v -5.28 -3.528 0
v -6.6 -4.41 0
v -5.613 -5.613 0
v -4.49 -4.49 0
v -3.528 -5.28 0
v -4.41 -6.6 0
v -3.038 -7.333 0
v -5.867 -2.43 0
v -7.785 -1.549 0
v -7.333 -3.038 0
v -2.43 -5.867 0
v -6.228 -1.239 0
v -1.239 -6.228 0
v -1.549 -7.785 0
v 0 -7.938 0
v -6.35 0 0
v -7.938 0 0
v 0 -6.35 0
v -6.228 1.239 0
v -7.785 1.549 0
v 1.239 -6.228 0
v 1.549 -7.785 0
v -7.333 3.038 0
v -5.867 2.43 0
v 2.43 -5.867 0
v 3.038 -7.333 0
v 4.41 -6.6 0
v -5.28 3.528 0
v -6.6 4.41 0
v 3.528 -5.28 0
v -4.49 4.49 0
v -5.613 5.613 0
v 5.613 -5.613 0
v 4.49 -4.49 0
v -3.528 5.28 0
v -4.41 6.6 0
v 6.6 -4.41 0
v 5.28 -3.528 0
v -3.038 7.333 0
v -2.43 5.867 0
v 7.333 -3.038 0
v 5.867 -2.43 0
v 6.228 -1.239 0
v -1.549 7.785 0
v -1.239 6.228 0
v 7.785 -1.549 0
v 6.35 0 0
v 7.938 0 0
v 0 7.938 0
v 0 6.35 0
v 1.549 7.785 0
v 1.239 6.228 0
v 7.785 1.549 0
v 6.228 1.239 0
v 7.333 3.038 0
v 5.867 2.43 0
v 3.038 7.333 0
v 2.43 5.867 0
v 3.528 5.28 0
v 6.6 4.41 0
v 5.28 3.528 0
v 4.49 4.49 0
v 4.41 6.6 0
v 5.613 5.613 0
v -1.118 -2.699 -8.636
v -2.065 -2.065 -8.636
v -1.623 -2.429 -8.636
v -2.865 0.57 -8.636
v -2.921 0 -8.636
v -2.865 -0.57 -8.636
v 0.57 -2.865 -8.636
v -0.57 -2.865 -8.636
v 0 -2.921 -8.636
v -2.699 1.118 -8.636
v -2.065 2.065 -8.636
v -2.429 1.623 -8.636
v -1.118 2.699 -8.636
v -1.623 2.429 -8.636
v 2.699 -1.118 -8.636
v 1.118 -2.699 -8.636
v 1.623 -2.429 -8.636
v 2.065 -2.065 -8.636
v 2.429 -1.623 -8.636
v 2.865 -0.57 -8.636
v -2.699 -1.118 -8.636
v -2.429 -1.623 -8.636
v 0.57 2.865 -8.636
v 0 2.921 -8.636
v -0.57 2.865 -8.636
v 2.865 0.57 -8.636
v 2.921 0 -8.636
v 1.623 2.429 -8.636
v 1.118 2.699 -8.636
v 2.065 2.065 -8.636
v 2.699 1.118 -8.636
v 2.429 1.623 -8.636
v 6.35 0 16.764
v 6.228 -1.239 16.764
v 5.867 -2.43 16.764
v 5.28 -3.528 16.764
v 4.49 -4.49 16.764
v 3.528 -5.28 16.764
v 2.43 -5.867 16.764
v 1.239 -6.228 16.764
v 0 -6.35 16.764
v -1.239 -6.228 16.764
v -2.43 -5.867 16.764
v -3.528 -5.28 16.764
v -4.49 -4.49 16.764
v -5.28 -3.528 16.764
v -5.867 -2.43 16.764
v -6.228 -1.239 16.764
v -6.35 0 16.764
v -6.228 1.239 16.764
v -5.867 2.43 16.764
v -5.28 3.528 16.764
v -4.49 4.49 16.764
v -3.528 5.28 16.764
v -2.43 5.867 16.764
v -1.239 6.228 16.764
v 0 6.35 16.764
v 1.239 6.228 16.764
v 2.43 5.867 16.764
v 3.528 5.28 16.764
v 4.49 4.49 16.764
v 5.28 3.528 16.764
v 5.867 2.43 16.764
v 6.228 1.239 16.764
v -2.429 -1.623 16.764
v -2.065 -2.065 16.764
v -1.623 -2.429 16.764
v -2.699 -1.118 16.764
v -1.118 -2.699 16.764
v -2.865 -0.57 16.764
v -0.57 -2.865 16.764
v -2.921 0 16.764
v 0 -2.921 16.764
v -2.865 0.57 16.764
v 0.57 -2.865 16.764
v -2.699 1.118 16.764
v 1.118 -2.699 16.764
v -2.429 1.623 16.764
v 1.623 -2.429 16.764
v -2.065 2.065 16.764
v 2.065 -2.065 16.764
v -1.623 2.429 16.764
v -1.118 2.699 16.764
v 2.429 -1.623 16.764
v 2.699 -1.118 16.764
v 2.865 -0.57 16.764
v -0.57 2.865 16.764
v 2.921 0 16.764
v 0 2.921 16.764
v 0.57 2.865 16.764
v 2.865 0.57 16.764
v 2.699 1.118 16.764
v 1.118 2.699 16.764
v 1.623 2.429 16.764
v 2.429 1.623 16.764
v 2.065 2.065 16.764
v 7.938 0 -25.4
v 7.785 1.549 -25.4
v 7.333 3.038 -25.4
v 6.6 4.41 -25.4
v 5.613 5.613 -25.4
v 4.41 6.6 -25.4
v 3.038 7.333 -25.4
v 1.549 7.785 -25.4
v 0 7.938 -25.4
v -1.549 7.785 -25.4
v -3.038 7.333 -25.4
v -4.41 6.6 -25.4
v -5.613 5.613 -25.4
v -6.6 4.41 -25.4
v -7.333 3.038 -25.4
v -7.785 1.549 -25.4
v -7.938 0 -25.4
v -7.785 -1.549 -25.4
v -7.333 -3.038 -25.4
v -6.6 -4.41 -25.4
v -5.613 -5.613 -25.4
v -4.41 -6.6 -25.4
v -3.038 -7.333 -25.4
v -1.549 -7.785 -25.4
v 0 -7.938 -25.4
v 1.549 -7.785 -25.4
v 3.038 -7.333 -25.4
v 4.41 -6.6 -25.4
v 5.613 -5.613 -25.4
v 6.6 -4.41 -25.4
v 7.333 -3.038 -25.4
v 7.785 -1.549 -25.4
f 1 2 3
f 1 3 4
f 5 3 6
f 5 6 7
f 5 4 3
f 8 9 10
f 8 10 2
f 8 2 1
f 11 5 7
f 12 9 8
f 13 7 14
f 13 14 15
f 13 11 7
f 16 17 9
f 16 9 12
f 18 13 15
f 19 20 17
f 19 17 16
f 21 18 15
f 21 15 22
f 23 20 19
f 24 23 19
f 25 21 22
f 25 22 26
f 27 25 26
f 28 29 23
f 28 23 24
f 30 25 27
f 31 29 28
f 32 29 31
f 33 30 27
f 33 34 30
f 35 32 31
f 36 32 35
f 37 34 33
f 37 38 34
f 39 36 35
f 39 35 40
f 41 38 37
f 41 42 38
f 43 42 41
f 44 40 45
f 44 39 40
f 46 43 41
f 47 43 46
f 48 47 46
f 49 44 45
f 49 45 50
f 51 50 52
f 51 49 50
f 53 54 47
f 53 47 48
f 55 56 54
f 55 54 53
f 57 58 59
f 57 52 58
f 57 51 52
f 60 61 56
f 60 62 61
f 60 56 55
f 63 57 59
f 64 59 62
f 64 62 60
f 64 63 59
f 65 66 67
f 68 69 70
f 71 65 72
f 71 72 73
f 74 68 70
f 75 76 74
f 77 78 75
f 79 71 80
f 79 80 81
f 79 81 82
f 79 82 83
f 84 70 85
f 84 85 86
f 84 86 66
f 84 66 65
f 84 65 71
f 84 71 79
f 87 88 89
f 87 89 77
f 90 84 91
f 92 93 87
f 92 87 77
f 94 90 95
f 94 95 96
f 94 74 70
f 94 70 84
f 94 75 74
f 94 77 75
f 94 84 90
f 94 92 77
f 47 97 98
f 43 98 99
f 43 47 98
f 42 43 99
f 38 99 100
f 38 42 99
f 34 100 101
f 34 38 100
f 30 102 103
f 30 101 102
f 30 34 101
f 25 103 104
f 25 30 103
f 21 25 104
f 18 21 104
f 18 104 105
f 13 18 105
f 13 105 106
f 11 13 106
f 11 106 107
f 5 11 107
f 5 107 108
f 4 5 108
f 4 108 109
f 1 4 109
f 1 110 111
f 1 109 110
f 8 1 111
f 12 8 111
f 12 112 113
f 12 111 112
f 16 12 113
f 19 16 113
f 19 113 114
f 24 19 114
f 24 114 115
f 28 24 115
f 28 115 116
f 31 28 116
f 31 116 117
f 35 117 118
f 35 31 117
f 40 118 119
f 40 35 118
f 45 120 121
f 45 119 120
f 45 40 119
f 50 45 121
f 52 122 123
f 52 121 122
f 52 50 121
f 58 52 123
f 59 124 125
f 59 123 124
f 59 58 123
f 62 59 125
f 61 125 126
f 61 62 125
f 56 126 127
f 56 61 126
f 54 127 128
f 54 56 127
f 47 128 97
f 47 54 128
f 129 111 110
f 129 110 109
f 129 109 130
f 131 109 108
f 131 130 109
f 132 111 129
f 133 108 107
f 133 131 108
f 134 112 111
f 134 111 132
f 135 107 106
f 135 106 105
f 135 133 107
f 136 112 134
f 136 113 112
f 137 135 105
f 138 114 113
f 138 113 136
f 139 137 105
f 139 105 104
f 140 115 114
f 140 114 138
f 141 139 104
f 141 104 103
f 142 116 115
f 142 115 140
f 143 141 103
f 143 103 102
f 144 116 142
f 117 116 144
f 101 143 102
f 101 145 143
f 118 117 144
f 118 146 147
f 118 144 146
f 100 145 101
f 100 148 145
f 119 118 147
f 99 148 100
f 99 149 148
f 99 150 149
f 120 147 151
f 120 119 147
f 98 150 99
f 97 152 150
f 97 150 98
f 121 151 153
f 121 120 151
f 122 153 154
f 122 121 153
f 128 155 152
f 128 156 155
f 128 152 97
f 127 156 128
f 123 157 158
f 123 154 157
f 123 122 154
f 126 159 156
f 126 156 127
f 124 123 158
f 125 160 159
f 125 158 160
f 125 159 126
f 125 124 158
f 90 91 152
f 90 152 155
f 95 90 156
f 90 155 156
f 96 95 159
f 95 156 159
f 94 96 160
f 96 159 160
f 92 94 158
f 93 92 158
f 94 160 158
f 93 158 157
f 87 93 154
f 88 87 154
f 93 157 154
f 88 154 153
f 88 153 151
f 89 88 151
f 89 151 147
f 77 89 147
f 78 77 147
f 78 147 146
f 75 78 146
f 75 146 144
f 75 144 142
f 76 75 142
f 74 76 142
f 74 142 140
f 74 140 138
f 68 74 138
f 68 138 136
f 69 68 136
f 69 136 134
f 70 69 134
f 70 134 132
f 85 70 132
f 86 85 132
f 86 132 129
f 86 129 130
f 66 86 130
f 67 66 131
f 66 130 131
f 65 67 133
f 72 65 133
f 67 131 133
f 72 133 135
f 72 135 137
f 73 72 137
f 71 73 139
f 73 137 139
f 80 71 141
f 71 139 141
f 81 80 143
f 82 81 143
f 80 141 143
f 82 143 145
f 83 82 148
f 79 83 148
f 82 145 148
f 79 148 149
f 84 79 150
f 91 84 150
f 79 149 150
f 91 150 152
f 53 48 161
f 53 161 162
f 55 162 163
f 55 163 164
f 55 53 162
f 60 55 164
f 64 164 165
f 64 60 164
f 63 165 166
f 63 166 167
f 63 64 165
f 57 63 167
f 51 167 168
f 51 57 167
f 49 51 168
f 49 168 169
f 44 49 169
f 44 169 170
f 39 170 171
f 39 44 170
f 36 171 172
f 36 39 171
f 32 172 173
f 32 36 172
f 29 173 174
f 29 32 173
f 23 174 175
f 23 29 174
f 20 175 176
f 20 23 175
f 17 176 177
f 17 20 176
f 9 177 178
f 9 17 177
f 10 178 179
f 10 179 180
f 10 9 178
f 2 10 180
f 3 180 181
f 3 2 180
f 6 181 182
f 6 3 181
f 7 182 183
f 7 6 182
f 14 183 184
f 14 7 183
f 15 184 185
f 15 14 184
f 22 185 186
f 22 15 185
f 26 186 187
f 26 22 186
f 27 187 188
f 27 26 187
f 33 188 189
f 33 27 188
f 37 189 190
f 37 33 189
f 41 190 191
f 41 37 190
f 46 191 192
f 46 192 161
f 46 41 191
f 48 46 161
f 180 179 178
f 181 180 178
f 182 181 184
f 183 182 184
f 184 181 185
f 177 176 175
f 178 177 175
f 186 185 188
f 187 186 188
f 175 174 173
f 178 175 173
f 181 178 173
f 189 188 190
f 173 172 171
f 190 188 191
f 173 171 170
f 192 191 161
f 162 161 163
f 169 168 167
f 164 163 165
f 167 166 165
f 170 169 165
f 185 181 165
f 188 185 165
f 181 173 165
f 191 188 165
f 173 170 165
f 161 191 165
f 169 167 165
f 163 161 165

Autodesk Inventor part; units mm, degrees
ref_plane "YZ Plane" through (0, 0, 0) normal (1, 0, 0) x (0, 1, 0)
ref_plane "XZ Plane" through (0, 0, 0) normal (0, 1, 0) x (-1, 0, 0)
ref_plane "XY Plane" through (0, 0, 0) normal (0, 0, 1) x (1, 0, 0)
sketch "Sketch1" plane through (0, 0, 0) normal (0, 0, 1) x (1, 0, 0)
  circle A0 centre (0, 0) radius 7.9375
  circle A1 centre (0, 0) radius 6.35
  dimension "d0" = 15.875
  dimension "d1" = 12.7
extrude "Extrusion1" add sketch "Sketch1" against normal blind 25.4 contours A0 | A1
extrude "Extrusion2" add sketch "Sketch1" along normal blind 16.764 contours A1
thread "Thread1" size "1/2-20 UNF" class "2A" standard "ANSI Unified Screw Threads" full length
sketch "Sketch2" plane through (0, 0, 16.764) normal (0, 0, 1) x (1, 0, 0)
  circle A0 centre (0, 0) radius 6.35 projected
  circle A1 centre (0, 0) radius 2.921
  dimension "d8" = 5.842
extrude "Extrusion3" cut sketch "Sketch2" against normal blind 25.4 contours A1
thread "Thread2" size "1/4-20 UNC" class "2B" standard "ANSI Unified Screw Threads" full length
properties part number "PDewalt Drill Shaft .5in"
